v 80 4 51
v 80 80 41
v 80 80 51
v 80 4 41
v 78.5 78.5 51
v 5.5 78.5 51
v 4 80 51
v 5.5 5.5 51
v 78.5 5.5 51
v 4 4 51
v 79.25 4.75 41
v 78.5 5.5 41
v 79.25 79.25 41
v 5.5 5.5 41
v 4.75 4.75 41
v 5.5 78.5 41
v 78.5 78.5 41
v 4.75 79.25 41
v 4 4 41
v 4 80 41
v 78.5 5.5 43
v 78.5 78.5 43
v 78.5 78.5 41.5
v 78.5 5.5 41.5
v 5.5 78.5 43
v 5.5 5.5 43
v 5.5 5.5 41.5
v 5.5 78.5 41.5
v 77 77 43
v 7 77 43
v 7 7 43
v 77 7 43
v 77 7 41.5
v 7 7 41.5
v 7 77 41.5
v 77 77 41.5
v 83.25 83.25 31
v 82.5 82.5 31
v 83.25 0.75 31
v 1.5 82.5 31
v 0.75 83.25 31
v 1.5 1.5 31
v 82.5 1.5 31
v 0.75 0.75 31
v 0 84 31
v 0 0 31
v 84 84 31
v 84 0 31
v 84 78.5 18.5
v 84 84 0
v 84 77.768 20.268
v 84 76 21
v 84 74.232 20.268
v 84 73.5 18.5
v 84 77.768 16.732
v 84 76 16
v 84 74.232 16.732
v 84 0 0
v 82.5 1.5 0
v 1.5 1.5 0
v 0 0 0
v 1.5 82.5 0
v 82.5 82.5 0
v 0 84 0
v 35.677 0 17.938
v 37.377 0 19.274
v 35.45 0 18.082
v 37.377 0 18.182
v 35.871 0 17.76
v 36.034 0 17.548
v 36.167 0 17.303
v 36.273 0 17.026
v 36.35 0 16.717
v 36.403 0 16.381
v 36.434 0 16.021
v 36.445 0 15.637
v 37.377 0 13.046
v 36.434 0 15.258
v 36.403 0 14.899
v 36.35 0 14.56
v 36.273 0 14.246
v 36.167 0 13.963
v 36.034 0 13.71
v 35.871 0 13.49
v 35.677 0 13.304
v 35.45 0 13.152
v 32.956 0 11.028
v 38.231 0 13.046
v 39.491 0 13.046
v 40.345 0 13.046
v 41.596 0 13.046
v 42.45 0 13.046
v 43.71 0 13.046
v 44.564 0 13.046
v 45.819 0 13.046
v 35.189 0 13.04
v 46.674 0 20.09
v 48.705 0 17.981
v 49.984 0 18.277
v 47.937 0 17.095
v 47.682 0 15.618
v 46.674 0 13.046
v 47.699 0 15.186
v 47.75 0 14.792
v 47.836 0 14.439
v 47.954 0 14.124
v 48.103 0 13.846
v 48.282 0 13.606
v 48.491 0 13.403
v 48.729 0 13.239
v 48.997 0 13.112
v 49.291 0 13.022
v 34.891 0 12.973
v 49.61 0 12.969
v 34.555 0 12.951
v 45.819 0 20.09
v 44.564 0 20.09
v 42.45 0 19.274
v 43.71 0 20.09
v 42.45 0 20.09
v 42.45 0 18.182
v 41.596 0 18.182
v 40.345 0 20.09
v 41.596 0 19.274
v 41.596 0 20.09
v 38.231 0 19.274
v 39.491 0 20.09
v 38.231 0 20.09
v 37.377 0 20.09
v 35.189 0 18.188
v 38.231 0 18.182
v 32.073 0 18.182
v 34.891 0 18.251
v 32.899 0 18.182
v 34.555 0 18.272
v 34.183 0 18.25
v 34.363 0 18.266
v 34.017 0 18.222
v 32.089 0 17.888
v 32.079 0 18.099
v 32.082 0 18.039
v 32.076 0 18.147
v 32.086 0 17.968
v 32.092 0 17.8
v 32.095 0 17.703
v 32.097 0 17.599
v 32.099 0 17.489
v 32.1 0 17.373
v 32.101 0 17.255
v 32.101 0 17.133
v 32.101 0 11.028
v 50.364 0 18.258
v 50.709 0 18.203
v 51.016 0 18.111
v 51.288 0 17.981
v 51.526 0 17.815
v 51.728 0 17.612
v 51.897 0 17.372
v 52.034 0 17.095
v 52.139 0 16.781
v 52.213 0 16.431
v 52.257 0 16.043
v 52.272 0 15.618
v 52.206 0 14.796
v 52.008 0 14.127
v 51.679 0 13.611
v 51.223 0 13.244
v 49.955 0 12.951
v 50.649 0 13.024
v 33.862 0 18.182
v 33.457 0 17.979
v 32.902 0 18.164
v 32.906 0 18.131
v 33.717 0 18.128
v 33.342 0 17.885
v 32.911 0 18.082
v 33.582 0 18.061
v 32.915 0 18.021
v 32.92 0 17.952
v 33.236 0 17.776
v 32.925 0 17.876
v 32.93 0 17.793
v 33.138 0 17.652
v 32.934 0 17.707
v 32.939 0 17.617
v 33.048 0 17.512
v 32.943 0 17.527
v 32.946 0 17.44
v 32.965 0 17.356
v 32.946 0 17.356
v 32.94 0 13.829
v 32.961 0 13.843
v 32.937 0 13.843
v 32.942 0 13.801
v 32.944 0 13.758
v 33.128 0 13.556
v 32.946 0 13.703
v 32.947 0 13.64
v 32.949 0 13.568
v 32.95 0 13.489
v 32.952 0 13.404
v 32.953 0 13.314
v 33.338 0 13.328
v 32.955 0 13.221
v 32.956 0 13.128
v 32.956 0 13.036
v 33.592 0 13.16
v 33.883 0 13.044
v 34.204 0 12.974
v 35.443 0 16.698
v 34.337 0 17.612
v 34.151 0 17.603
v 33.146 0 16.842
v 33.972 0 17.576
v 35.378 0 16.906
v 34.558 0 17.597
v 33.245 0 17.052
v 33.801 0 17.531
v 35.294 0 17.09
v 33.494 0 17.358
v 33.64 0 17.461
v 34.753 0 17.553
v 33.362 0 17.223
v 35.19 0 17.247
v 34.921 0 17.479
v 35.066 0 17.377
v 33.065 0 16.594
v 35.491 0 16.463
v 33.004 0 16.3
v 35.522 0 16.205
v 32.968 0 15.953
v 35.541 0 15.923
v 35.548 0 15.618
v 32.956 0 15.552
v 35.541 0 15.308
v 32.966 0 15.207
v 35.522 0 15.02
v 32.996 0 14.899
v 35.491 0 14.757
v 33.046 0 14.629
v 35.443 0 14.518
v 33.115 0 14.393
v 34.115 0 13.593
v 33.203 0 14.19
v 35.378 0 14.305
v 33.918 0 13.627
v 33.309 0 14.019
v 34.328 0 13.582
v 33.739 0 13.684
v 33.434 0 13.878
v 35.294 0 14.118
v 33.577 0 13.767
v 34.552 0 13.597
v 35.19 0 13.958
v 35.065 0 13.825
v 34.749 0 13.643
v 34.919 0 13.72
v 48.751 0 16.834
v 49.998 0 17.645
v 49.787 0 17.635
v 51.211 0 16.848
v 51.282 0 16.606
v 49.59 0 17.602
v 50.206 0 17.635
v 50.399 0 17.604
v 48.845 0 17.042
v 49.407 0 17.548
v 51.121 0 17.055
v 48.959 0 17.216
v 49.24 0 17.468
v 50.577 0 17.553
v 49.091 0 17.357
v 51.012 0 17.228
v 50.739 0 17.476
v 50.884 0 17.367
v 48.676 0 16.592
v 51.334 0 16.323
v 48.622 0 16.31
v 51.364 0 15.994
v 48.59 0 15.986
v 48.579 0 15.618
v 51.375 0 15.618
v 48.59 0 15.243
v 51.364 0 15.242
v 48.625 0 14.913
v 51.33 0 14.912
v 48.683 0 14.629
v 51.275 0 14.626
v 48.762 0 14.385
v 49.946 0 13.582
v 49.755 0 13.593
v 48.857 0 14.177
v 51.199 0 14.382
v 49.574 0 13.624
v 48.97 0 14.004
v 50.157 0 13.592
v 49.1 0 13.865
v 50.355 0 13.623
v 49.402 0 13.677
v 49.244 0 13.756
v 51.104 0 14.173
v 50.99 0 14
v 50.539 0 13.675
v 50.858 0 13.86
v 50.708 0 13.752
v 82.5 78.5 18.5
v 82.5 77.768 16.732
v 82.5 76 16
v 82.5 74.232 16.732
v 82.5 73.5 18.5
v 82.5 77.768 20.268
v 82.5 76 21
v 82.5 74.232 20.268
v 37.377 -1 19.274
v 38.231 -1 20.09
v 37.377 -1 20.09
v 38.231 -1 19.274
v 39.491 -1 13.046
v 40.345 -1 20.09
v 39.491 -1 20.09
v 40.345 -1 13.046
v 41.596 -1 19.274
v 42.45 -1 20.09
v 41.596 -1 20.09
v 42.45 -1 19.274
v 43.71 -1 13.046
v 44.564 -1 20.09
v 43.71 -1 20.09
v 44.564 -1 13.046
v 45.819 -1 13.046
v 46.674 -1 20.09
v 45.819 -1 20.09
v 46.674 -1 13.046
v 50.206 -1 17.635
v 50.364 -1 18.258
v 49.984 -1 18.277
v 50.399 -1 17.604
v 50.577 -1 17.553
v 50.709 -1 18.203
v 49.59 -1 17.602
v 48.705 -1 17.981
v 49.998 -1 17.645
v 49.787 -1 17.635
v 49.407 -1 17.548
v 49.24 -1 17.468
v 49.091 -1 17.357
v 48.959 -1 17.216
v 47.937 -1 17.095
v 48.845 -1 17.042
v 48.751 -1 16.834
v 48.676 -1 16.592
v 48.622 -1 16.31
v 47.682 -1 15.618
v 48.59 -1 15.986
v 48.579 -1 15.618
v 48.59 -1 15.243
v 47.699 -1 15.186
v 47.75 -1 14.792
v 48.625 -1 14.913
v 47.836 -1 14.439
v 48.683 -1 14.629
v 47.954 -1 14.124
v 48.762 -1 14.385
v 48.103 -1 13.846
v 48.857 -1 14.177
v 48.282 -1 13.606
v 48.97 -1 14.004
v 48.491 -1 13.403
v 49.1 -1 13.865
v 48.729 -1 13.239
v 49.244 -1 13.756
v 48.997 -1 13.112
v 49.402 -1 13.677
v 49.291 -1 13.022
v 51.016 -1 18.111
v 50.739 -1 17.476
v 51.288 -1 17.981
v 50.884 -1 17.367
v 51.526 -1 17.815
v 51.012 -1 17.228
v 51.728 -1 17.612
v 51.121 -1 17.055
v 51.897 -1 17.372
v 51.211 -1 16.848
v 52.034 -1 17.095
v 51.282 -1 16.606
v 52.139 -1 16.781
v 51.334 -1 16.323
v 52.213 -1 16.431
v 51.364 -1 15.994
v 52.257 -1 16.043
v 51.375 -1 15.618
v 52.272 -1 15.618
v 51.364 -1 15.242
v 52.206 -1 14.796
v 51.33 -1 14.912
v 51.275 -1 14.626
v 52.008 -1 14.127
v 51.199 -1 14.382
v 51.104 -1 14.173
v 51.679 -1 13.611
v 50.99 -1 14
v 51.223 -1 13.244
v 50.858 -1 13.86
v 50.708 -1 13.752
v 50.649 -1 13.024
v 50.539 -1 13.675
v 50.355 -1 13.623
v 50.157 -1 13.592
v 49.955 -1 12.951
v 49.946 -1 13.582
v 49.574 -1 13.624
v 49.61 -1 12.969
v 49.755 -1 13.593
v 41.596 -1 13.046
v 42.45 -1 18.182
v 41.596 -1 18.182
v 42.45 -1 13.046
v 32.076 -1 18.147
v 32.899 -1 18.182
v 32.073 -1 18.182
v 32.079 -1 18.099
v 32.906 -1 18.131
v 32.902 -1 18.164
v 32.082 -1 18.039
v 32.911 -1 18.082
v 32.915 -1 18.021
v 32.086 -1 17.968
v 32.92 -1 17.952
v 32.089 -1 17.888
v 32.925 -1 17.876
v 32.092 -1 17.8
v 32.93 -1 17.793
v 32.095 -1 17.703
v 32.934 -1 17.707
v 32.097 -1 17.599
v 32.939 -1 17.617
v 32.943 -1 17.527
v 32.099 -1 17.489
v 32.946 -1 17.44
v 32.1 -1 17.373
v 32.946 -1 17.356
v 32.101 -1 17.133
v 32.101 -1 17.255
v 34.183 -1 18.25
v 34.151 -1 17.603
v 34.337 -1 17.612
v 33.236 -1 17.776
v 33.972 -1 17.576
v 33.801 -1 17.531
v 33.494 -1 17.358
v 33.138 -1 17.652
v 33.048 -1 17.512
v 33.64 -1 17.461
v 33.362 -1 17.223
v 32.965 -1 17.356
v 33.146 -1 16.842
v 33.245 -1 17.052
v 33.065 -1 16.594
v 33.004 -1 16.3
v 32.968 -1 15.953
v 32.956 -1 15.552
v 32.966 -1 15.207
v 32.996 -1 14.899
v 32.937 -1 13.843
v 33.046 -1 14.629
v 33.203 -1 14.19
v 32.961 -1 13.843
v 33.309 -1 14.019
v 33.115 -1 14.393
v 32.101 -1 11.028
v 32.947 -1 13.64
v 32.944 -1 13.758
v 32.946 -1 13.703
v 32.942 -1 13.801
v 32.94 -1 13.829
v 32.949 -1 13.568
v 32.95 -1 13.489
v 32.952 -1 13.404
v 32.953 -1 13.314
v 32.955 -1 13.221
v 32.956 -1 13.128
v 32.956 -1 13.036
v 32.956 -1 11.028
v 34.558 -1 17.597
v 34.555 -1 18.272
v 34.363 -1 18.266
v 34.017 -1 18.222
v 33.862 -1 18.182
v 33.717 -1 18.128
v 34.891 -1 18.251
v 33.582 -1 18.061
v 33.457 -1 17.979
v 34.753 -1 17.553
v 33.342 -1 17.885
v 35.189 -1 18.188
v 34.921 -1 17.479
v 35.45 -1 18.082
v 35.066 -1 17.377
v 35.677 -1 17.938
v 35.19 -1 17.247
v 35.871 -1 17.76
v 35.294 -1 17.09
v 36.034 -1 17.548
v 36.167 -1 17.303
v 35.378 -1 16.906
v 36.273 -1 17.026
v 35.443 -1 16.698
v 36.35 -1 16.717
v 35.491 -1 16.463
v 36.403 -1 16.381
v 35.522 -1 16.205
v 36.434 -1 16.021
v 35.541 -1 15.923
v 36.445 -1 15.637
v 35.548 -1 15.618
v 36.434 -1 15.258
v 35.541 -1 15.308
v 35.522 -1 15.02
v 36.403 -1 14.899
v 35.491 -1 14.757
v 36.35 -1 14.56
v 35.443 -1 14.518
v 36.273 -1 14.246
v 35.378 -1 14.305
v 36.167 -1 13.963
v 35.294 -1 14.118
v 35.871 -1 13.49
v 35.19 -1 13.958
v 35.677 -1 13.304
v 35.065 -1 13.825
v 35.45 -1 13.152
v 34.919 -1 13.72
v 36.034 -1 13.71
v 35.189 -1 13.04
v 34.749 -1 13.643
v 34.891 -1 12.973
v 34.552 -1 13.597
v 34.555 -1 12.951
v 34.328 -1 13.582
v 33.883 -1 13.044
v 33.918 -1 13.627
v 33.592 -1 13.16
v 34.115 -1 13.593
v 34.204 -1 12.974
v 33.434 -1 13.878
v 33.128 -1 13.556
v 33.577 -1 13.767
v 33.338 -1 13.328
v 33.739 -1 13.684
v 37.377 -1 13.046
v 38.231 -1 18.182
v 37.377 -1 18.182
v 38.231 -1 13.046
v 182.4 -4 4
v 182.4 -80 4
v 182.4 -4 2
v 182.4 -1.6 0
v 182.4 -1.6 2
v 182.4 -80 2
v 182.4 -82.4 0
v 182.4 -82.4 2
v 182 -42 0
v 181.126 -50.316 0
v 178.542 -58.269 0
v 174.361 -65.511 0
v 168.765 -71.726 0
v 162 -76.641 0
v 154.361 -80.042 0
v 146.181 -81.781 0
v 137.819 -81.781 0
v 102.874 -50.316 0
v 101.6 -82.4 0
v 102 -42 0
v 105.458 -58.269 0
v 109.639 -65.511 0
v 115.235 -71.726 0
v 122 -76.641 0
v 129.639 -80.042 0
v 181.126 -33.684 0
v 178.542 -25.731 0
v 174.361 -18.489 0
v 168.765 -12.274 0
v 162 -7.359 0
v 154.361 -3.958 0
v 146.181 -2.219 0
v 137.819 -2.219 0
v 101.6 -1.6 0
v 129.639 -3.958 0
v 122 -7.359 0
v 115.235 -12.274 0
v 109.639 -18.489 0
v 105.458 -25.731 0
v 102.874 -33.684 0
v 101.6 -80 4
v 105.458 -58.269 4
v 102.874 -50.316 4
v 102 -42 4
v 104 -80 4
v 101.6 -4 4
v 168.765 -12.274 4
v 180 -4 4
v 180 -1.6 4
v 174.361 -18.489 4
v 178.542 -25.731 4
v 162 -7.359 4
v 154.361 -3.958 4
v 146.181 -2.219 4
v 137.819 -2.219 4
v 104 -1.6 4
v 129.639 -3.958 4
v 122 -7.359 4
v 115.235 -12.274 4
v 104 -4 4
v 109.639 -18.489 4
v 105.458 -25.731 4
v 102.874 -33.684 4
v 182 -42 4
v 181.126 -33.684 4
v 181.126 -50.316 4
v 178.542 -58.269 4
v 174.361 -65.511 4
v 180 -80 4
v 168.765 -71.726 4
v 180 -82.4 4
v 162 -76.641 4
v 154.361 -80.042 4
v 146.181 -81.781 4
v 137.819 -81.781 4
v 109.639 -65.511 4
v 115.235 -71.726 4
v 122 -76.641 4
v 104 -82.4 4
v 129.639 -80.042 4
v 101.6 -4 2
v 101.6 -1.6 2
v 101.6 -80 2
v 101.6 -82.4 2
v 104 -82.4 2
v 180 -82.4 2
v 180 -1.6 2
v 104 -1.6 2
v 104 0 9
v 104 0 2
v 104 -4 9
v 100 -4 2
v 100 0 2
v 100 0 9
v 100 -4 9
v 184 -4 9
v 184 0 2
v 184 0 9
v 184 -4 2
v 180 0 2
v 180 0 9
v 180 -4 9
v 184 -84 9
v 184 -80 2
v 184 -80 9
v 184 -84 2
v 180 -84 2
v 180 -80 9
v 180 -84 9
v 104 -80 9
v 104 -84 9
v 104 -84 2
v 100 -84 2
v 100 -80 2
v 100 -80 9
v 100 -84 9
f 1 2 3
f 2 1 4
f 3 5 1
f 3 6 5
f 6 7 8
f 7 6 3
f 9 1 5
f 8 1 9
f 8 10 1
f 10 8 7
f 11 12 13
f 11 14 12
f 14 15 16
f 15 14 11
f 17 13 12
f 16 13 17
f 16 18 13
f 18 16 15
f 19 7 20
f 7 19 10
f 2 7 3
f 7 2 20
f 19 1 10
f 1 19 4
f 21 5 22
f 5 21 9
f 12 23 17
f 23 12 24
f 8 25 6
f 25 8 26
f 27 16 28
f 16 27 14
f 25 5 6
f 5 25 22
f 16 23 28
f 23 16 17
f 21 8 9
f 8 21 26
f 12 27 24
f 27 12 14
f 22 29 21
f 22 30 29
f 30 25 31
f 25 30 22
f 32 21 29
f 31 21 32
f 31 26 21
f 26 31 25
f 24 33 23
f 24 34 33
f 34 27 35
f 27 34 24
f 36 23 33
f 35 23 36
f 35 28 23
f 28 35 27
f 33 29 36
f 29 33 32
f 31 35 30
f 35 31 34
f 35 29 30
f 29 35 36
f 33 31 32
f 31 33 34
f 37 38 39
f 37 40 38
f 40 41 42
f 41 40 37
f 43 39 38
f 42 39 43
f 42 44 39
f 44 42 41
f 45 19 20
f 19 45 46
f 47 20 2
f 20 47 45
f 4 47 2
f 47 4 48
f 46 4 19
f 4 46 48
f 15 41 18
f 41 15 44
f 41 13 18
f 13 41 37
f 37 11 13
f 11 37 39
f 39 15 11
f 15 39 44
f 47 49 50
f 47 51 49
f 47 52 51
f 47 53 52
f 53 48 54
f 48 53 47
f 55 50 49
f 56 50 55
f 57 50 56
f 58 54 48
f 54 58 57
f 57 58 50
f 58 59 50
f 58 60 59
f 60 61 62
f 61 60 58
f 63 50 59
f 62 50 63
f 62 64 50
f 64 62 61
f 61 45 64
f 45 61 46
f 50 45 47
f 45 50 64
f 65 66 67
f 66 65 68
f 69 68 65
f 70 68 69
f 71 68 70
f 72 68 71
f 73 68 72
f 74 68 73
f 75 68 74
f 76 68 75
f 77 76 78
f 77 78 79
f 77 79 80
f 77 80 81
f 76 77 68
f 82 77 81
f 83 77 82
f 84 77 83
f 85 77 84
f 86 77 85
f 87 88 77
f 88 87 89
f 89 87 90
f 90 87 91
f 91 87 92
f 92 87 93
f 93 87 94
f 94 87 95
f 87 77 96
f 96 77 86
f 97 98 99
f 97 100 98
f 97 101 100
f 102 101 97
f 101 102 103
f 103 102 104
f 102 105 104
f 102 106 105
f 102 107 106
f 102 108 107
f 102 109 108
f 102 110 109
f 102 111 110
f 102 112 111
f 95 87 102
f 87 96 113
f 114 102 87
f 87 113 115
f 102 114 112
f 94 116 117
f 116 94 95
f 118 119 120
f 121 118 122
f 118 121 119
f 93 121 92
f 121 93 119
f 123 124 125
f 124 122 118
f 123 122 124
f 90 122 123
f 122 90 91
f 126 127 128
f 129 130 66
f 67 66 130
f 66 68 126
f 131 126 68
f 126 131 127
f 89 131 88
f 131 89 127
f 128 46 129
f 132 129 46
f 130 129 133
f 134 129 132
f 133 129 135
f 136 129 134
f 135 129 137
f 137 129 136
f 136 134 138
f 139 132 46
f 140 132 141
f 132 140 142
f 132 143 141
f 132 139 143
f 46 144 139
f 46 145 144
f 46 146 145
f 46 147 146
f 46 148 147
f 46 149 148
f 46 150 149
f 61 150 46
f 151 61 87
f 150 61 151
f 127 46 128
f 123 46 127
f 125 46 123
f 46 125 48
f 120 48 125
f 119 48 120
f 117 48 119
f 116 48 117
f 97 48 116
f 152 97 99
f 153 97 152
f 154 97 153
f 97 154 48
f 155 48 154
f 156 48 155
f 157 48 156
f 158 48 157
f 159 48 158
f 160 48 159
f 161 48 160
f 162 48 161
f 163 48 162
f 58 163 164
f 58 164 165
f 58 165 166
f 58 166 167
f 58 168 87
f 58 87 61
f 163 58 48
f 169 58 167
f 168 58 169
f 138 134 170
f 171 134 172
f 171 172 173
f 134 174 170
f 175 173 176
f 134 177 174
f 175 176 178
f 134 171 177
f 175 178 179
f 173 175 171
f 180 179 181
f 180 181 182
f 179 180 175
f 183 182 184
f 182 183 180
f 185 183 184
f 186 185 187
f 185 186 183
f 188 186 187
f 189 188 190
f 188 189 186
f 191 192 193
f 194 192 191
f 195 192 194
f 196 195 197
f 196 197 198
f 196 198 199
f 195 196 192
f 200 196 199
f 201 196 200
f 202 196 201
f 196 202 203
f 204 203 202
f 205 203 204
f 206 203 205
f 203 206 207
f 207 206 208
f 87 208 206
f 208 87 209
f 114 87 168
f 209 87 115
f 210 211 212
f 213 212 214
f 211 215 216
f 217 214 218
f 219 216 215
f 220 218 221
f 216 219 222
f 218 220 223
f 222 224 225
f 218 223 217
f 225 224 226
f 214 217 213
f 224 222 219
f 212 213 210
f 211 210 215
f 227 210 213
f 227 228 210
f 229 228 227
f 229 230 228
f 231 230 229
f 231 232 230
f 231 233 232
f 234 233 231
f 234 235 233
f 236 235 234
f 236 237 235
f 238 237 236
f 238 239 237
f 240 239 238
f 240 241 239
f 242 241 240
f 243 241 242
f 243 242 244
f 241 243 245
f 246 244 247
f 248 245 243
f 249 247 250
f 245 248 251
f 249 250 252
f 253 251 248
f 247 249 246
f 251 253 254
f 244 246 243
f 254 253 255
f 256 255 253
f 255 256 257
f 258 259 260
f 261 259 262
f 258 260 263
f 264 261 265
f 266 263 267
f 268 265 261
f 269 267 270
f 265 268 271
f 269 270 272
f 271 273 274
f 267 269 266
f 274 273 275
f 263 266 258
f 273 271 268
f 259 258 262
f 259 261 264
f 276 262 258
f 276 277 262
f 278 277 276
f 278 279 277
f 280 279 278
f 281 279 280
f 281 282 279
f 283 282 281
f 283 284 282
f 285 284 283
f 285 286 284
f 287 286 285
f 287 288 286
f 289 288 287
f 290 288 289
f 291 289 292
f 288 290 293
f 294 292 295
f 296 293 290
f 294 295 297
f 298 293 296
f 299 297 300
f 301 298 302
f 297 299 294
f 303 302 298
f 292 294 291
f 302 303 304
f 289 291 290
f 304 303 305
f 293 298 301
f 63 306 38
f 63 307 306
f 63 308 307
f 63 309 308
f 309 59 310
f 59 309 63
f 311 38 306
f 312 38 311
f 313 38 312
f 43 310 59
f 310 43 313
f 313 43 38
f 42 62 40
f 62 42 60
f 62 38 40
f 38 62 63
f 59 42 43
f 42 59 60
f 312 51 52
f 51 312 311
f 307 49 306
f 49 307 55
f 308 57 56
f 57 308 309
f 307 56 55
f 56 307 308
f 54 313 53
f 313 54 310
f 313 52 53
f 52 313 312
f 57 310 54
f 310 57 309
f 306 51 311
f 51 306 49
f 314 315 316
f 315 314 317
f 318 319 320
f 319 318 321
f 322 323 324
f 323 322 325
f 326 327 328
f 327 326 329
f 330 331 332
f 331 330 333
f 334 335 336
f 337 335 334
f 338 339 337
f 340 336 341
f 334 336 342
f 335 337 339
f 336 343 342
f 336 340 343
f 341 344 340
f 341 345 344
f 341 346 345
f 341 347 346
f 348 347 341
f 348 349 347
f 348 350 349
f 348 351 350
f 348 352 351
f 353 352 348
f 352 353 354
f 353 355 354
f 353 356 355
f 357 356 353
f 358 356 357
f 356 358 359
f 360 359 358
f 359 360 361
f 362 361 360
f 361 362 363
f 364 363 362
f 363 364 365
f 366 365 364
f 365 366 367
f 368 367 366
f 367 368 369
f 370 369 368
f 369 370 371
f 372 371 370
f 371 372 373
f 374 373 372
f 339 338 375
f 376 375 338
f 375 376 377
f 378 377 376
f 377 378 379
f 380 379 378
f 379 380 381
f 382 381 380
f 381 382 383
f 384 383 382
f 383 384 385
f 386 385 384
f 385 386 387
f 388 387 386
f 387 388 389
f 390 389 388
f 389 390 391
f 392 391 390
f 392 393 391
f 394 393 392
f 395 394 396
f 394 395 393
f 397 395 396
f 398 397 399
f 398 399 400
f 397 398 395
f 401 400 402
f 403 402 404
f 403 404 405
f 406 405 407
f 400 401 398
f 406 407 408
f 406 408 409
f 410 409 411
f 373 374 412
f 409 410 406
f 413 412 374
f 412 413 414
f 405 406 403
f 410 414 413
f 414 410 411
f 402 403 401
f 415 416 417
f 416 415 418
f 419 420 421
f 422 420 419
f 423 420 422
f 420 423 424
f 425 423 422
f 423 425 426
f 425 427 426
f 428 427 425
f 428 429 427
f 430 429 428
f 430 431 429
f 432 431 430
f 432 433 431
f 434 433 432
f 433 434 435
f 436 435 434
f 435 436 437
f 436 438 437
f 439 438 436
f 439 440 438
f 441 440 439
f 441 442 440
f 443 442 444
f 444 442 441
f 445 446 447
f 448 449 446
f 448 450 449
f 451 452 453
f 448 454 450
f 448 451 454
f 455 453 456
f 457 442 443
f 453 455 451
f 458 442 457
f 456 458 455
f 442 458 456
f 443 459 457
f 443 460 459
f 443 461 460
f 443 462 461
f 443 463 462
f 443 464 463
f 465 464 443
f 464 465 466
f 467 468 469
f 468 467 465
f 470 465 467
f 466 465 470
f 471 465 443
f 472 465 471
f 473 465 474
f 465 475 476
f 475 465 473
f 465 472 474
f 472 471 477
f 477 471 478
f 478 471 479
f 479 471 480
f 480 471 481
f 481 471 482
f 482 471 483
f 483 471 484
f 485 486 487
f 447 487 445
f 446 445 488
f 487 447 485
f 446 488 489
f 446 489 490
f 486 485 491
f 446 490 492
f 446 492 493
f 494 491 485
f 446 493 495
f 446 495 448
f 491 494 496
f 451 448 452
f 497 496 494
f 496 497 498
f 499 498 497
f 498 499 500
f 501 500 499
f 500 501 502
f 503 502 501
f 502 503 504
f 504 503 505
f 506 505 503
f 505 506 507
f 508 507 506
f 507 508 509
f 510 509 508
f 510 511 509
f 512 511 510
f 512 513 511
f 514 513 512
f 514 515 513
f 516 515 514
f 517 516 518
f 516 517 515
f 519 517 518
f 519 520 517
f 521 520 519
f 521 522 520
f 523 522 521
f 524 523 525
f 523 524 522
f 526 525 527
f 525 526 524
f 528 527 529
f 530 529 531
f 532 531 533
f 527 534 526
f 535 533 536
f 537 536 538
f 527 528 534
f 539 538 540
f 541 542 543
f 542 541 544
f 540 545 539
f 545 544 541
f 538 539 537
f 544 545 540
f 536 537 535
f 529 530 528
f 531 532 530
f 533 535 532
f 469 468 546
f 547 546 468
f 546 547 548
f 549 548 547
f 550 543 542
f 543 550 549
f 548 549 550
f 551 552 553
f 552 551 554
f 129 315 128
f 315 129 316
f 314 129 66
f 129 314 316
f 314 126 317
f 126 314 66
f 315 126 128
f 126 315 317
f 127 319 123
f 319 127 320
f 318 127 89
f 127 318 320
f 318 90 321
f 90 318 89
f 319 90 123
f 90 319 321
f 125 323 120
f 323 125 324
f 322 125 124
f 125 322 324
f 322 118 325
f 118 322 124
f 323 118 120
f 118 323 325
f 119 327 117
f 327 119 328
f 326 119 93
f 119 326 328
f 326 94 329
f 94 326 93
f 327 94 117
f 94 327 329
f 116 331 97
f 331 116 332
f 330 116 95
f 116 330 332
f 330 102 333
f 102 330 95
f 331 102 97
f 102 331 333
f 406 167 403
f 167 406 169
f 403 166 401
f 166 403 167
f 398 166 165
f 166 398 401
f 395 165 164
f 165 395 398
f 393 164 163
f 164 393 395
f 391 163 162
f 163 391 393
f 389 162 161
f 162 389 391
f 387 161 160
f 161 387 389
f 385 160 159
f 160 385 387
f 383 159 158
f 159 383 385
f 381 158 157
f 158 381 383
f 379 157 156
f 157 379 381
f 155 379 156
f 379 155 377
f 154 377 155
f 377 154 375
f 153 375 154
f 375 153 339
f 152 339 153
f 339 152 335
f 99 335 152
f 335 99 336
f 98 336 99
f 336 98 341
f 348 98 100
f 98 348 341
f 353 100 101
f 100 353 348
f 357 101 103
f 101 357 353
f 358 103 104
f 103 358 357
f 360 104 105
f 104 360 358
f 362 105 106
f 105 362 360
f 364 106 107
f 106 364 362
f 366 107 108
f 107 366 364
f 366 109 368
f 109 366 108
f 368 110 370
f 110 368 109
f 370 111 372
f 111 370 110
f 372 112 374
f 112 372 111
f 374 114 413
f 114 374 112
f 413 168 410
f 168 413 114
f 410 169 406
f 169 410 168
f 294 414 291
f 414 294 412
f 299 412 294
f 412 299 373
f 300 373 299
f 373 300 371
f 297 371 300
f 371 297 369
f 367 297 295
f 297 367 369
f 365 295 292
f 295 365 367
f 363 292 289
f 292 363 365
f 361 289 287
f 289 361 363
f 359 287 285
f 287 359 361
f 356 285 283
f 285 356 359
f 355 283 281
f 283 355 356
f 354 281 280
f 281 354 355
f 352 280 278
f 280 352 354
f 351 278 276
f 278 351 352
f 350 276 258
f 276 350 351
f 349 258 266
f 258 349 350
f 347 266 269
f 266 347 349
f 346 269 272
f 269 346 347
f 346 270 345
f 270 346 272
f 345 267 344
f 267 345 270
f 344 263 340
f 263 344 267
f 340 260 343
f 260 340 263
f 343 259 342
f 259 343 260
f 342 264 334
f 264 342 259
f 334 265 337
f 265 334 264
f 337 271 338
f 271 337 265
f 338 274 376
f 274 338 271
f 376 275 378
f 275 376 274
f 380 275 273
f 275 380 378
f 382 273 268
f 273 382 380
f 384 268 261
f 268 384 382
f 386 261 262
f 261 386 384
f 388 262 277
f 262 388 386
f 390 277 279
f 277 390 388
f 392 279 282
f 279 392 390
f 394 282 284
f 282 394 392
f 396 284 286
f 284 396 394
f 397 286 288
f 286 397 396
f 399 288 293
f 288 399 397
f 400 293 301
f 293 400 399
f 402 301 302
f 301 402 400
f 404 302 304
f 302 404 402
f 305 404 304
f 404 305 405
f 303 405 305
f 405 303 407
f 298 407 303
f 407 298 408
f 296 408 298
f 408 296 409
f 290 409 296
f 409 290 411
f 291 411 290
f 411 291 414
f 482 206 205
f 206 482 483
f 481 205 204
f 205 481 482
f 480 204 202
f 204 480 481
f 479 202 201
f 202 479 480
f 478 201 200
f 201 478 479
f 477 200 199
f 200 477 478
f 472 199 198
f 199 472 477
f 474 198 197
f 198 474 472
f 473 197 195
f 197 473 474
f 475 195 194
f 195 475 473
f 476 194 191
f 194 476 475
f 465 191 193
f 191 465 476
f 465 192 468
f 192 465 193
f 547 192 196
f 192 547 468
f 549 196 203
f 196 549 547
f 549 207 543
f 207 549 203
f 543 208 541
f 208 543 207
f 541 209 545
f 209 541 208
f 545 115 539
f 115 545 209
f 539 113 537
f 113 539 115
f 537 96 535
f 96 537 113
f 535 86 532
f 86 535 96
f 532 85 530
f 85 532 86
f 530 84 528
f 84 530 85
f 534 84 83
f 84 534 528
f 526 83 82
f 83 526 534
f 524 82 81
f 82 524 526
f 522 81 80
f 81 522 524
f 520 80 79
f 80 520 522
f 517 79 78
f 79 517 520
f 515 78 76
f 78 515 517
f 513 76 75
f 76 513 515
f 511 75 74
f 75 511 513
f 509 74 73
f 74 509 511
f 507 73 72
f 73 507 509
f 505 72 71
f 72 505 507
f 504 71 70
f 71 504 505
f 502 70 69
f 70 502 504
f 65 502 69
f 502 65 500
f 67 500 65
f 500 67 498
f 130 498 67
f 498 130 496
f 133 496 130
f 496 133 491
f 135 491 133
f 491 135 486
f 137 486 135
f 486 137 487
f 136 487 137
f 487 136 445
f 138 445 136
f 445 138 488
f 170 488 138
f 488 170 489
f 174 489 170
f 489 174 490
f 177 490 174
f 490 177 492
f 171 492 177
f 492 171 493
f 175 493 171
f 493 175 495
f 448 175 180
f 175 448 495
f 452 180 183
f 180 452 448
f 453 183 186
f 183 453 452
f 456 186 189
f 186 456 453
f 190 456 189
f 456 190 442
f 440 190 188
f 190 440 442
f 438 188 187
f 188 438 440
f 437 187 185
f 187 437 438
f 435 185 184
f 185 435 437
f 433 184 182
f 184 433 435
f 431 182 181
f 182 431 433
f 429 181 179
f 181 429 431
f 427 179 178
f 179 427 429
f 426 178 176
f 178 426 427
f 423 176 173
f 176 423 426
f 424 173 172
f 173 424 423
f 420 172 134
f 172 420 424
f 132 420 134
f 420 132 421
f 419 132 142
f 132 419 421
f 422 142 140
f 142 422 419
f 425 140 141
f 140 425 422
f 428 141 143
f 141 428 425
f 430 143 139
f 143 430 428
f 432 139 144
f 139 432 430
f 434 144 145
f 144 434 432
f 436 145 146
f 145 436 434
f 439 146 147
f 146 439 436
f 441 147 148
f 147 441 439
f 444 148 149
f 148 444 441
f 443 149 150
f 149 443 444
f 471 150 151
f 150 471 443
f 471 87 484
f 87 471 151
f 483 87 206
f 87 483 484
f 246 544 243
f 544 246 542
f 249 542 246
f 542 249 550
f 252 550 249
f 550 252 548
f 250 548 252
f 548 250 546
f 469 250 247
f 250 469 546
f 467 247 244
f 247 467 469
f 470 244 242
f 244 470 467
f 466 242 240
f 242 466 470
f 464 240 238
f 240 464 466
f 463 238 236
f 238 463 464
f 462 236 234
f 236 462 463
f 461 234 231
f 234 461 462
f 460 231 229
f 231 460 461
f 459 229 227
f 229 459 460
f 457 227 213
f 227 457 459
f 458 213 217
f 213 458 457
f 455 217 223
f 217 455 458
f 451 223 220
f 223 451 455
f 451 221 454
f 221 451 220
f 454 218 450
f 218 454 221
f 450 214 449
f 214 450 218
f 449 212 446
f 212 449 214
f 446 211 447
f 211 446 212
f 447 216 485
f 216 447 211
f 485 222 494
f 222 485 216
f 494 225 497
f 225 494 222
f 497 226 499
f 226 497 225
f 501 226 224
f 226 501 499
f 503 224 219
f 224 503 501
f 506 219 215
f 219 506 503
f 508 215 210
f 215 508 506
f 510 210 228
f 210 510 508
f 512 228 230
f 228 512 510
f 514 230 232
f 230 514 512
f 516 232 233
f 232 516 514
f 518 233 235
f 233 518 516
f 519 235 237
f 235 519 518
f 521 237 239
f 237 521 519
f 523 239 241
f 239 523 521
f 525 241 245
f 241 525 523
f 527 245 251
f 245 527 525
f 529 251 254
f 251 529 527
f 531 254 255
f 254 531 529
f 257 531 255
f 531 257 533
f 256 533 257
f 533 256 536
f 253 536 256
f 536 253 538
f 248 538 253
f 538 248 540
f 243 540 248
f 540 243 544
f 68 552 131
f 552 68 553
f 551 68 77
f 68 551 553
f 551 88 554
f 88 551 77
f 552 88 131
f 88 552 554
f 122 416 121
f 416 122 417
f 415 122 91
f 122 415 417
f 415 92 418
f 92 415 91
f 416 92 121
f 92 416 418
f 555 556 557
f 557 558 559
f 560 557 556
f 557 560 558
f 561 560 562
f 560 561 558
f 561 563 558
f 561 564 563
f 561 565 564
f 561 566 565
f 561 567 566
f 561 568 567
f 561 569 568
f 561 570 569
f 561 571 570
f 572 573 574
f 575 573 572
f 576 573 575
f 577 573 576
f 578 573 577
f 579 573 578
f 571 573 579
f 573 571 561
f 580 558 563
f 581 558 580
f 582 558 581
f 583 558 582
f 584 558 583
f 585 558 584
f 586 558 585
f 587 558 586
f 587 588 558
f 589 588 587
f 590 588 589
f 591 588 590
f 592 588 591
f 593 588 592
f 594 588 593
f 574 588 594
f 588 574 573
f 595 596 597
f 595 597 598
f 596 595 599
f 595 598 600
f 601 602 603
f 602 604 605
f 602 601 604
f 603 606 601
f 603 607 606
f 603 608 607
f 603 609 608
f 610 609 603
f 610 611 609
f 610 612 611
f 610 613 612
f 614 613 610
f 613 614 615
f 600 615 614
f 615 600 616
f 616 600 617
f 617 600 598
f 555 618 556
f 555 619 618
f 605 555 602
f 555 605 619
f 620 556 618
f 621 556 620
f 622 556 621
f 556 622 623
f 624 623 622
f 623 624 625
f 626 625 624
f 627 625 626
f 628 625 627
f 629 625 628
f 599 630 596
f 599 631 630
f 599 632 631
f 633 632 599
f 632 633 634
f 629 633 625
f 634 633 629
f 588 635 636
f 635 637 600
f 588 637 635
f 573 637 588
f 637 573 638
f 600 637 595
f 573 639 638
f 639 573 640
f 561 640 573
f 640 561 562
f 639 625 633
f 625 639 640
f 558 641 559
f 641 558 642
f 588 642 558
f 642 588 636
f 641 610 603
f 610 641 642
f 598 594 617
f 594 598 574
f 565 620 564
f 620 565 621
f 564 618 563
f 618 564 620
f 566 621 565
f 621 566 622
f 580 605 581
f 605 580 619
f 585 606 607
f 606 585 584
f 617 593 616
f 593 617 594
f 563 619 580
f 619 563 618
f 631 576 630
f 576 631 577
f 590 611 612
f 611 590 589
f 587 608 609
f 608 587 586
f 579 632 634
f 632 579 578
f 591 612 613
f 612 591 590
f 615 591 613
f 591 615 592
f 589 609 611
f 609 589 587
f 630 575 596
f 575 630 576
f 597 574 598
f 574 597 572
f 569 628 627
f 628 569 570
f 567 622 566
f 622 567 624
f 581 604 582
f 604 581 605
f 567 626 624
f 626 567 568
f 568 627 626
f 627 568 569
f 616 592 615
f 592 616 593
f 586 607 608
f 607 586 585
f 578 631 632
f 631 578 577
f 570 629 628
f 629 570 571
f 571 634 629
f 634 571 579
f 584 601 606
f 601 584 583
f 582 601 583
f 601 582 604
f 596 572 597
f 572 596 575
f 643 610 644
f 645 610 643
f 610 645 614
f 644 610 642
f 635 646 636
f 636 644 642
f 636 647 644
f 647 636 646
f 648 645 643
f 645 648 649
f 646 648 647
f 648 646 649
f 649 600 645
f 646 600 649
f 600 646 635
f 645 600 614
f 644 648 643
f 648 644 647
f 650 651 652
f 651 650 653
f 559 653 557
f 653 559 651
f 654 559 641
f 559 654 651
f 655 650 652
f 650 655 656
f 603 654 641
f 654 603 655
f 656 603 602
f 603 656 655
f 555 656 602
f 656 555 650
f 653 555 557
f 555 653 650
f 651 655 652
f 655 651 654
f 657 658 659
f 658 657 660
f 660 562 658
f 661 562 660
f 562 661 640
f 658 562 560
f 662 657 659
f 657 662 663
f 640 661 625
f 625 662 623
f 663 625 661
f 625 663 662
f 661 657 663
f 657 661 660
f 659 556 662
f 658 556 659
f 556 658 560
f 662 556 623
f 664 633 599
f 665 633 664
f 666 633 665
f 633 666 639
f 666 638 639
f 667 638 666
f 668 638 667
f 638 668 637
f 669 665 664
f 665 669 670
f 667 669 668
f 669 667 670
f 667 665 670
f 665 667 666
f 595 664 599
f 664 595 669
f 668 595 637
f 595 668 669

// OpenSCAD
//fan_type = "flat";
fan_type = "flat";

// global stuff
// 1) connection box size
height_in_top_cubicle   = 8; 
box_side            =   73;
box_height          =   70;
box_border_width    =   1.5;   
// 2) air holes
spacing             =   5;
fig_size            =   4;
fig_number_per_side =   15;
num_hole_layers     =   4;

// since the assignments would only e valid inside the bracket scope we got to comment the if out :(
/*
if (fan_type == "propeller"){
    // *** propeller-like fan ***
    motor_diameter      =   23;
    motor_height        =   30;

    fan_diameter        = 52;
    fan_height          = 20;
    fan_connection_height = 5;

    spacing             =   5;
    fig_size            =   4;
    fig_number_per_side =   12;
    num_hole_layers     =   4;

    fan_positioning     =   (box_height / 2) - (box_height / 6);
    support_disk_height =   5;
    support_disk_width  =   3;

    add_motor_holder_floor  = true; 
} else {
*/
    // *** flat fan PC-like ***
 
    // top connection + fan + filter block + legs
    // 1) top connection
    connection_box_height   = 10;
    
    // block_side = fan_diameter + box_border_width;
    
    // 2) fan block
    fan_diameter        = 80;
    fan_height          = 25;
    game                = 1;
    wire_hole_diameter = 5;
    
    // 3) filter block
    filter_side         = 80;
    filter_height       = 6;    // in 6 mm we should be able to place the filter
    
    // 4) leg block
    leg_box_height      = 4;
    leg_in_top_box      = 4;
    leg_width           = 4;
    leg_height          = 7;

    // fan positioning wrt main box
    fan_positioning     =   box_height / 2;
    
//}



module draw_holes(n_l, side){
    // draw the air holes
    for(h=[0:n_l-1]){
        for(f=[0:fig_number_per_side-1]){
            for(y=[0:1]){
                translate([spacing + f*spacing, y*side-(box_border_width/2), spacing/2 + h*spacing ])
                    cube([fig_size, box_border_width, fig_size]);
            }
                
            for(x=[0:1]){
                translate([x*side-(box_border_width/2), spacing+ f*spacing , spacing/2 + h*spacing])
                    cube([box_border_width, fig_size, fig_size]);
            }    
        }
    }
}

module cubicle(draw_legs = true){
    if(fan_type == "propeller"){
        // draw the cube
        difference(){
            cube(size = [box_side,box_side,box_height], center = false);
            translate([box_border_width/2, box_border_width/2, 0])
                cube(size = [box_side-box_border_width, box_side-box_border_width, box_height], center = false);        

            draw_holes(num_hole_layers, box_side);
        }

        // add a stand for the top cube
        translate([0,0, box_height-(height_in_top_cubicle+box_border_width)]){        
            difference(){
                cube(size = [box_side,box_side,box_border_width], center = false);
                
                translate([box_border_width, box_border_width, 0])
                    cube(size = [box_side-box_border_width*2, box_side-box_border_width*2, box_border_width], center = false);  
            }
        }
    }else{
        // 1) draw the connection cube
        box_side = box_side + 2*box_border_width;
        block_side = fan_diameter + 2*box_border_width + game;
        block_height = fan_height + filter_height;
        
        shift = (block_side - box_side)/2;
        union(){
            translate([shift, shift, block_height + connection_box_height])
                union(){ 
                    difference(){
                        cube(size = [box_side,box_side,connection_box_height], center = false);
                        translate([box_border_width, box_border_width, 0])
                            cube(size = [box_side-2*box_border_width, box_side-2*box_border_width, connection_box_height], center = false);        
                    }

                    // add a stand for the top cube
                    translate([0,0, connection_box_height-(height_in_top_cubicle+box_border_width)]){        
                        difference(){
                            cube(size = [box_side, box_side, box_border_width], center = false);
                            
                            translate([2*box_border_width, 2*box_border_width, 0])
                                cube(size = [box_side-box_border_width*4, box_side-box_border_width*4, box_border_width],
                                     center = false);  
                        }
                    }
                }
            
            // 2) draw the connection shape
            translate([0, 0, block_height])
                difference(){
                    weird_cube([// bottom
                                [0,0,0],
                                [block_side,0,0],
                                [block_side,block_side,0],
                                [0,block_side,0],
                                // top
                                [shift, shift, connection_box_height],
                                [box_side+shift, shift, connection_box_height],
                                [box_side+shift, box_side+shift, connection_box_height],
                                [shift, box_side+shift, connection_box_height]]);
                    
                    translate([box_border_width/2, box_border_width/2, 0])
                        weird_cube([
                                    // bottom
                                    [0,0,0], 
                                    [block_side-box_border_width, 0,0], 
                                    [block_side-box_border_width, block_side-box_border_width, 0],
                                    [0, block_side - box_border_width, 0],
                                    
                                    // top
                                    [shift, shift, connection_box_height],
                                    [shift+box_side-box_border_width, shift, connection_box_height],
                                    [shift+box_side-box_border_width,shift+box_side-box_border_width, connection_box_height],
                                    [shift, shift+box_side-box_border_width, connection_box_height]]);
                }
                
            
            // 3) draw the main fan cube
            translate([0, 0, 0])
                difference(){
                    cube(size = [block_side, block_side, block_height], center = false);
                    translate([box_border_width, box_border_width, 0])
                        cube(size = [fan_diameter+game,
                                     fan_diameter+game,
                                     box_height], center = false);
                    //draw_holes(num_hole_layers, block_side);
                    // draw the wiring hole
                    translate([block_side, block_side-2*shift, filter_height + fan_height/2]) //block_height/2])
                        rotate([0,-90,0])
                                cylinder(h = box_border_width, r1 = wire_hole_diameter/2, r2 = wire_hole_diameter/2, center = false);
                }
                
            
                
            // 4) add logo
            add_logo(size=7, pos_x = block_side/2, pos_y=0, pos_z=block_height/2);
        }
        
        if(draw_legs == true){

            // 5) draw the leg cube
            in_top_box = 4;
            in_legs = 2;

            //translate([100, 0, leg_box_height-in_legs]) // when debugging
            translate([100, 0, leg_box_height]) // upside down
            rotate([180,0,0])
                union(){
                    difference(){
                        // connection square
                        translate([box_border_width+0.1*game, box_border_width+0.1*game, 0])
                            cube(size = [fan_diameter+0.8*game, fan_diameter+0.8*game, leg_box_height], center = false);
                        
                        translate([block_side/2, block_side/2, 0])
                            cylinder(h = leg_box_height, r1 = fan_diameter/2, r2 = fan_diameter/2, center = false);
                    }
                                            
                    // add legs, they will also act as support for the whole thingie
                    translate([0,0,-(leg_height-in_legs)])
                    union(){
                        translate([0, 0, 0])
                            cube(size = [leg_width,leg_width, leg_height], center = false);
                        
                        translate([block_side-leg_width, 0, 0])
                            cube(size = [leg_width, leg_width, leg_height], center = false);
                            
                        translate([block_side-leg_width, block_side-leg_width, 0])
                            cube(size = [leg_width, leg_width, leg_height], center = false);
                            
                        translate([0, block_side-leg_width, 0])
                            cube(size = [leg_width, leg_width, leg_height], center = false);
                    }
                }
        }
            
    }
}

module fan_support(add_motor_holder_floor = true){

    if(fan_type == "propeller"){
        // add support cylinder
        difference(){
            union(){   
                // add support to the support cylinder (arms)
                translate([0, (box_side/2)-box_border_width/2, fan_positioning]) cube([box_side, box_border_width, box_border_width], center = false);
                
                // add support to the support cylinder (arms)
                rotate(angle=90, [1, 0, 0]){
                    translate([0, (box_side/2)-box_border_width/2, fan_positioning])
                        cube([box_side, box_border_width, box_border_width], center = false);
                }
            
                // add support cylinder (rounded thingie)
                translate([(box_side/2), (box_side/2), fan_positioning]) cylinder(h = support_disk_height, r1 = motor_diameter/2 + support_disk_width, r2 = motor_diameter/2 + support_disk_width, center = false);
            }
            // remove motor size
            translate([(box_side/2), (box_side/2), fan_positioning])
                cylinder(h = support_disk_height, r1 = motor_diameter/2, r2 = motor_diameter/2, center = false);
        }
        
        if(add_motor_holder_floor){
            // add floor to motor holder
            difference(){
                translate([(box_side/2), (box_side/2), fan_positioning-motor_height/2])
                    cylinder(h = support_disk_height/2, r1 = motor_diameter/2 + support_disk_width, r2 = motor_diameter/2 + support_disk_width, center = false);
                
                translate([(box_side/2), (box_side/2), fan_positioning-motor_height/2])
                    cylinder(h = support_disk_height/2, r1 = motor_diameter/4, r2 = motor_diameter/2, center = false);
            }

            translate([(box_side/2)-(box_border_width + motor_diameter/2), (box_side/2)-(box_border_width/2), fan_positioning-motor_height/2])
                cube([box_border_width, box_border_width, motor_height/2], center = false);
            
            translate([(box_side/2)+(motor_diameter/2), (box_side/2)-(box_border_width/2), fan_positioning-motor_height/2])
                cube([box_border_width, box_border_width, motor_height/2], center = false);
        }
        
    }else{
        // flat fan type (noop)
        
    }
}

 module weird_cube(pps){ 
     polyhedron(
      points=pps,
      faces=[ [0,1,2,3], [3,2,6,7], [7,6,5,4], [4,0,3,7], [0,4,5,1], [1,5,6,2] ]
     );
 }

module show_fan(){
    if(fan_type == "propeller"){
        // show propeller as cone
        translate([(box_side/2), (box_side/2), fan_positioning+(motor_height/2)+fan_connection_height])
            color("grey")
                cylinder(h=fan_height, r1=fan_diameter/2, r2=fan_diameter/4, center=false);
    }else{
        // show common pc fan as cube-like
        translate([(box_side/2), (box_side/2), fan_positioning-fan_height/2])
            color("grey")
                cube([fan_diameter, fan_diameter, fan_height]);
    }
}

module show_motor(){
    if(fan_type == "propeller"){
        translate([(box_side/2), (box_side/2), fan_positioning-motor_height/2])
            color("grey")
                cylinder(h=motor_height, r1=motor_diameter/2, r2=motor_diameter/2, center=false);
    }else{
        // do nothing, the motor is integrated in the fan
    }
}

module random_stand(bs, bh, threshold = 10, seed, growing_only=true){ 
    min_threshold = threshold;
    if (growing_only) {
        min_threshold = 0;
    }
    
    random_vect = rands(bs-min_threshold, bs+threshold, 4, seed);
    
    weird_cube([[0,0,0], [random_vect[0],0,0], [random_vect[1],random_vect[2],0], [0,random_vect[3],0],      // bottom square (can be changed at wish)
                [0,0,bh], [bs,0,bh], [bs,bs,bh], [0,bs,bh]   // top square (has to match the existing cubicle)
    ]);
}

module add_logo(string = "pilillo", logo_depth= 1, strlen = 7, size=10,  pos_x, pos_y, pos_z){

    translate([pos_x, pos_y, pos_z])
        rotate([90, 0, 0])
            linear_extrude(height = logo_depth) {
                text(string, size = size, font = "Liberation Sans", halign = "center", valign = "center", $fn = 16);
            }
            //text(string, size = size, font = "Liberation Sans", halign = "center", valign = "center", $fn = 16);
}


// did a mistake with the size of the top connection, so using the module extension to fix it (no need if you set the vars correctly)
module extension(height = 7){

    box_outside = box_side + 2*box_border_width + game;
    echo("box_outside:"); echo(box_outside);
    echo("box_inside:"); echo(box_side);
    
    // top connection
    translate([0, 0, height/2])
    difference(){
        cube(size = [box_outside, box_outside, height/2], center = false);
        translate([box_border_width+game/2, box_border_width+game/2, 0])
            cube(size = [box_side, box_side, height/2], center = false);
    }
    
    // bottom connection
    shift = (box_outside - box_side) / 2;
    translate([shift, shift, 0])
    difference(){
        translate([box_border_width, box_border_width, 0])
        cube(size = [box_side-2*box_border_width, box_side-2*box_border_width, height/2], center = false);
        translate([2*box_border_width, 2*box_border_width, 0])
            cube(size = [box_side-4*box_border_width, box_side-4*box_border_width, height/2], center = false);
    }
    
    bh = 2;
    // draw the connection shape
    translate([0, box_outside, height/2])
    rotate([180,0,0])
        difference(){
                weird_cube([// bottom
                                [0,0,0],
                                [box_outside,0,0],
                                [box_outside,box_outside,0],
                                [0,box_outside,0],
                                // top
                                [shift, shift, bh],
                                [box_side+shift, shift, bh],
                                [box_side+shift, box_side+shift, bh],
                                [shift, box_side+shift, bh]]);
                    
                    translate([box_border_width/2, box_border_width/2, 0])
                        weird_cube([
                                    // bottom
                                    [0,0,0], 
                                    [box_outside-box_border_width, 0,0], 
                                    [box_outside-box_border_width, box_outside-box_border_width, 0],
                                    [0, box_outside - box_border_width, 0],
                                    
                                    // top
                                    [shift+game, shift+game, bh],
                                    [shift+box_side-(box_border_width+game), shift+game, bh],
                                    [shift+box_side-(box_border_width+game),shift+box_side-(box_border_width+game), bh],
                                    [shift+game, shift+box_side-(box_border_width+game), bh]]);
        }
     
}

//extension();
cubicle(draw_legs = true);

//fan_support();
//show_motor();
//show_fan();
